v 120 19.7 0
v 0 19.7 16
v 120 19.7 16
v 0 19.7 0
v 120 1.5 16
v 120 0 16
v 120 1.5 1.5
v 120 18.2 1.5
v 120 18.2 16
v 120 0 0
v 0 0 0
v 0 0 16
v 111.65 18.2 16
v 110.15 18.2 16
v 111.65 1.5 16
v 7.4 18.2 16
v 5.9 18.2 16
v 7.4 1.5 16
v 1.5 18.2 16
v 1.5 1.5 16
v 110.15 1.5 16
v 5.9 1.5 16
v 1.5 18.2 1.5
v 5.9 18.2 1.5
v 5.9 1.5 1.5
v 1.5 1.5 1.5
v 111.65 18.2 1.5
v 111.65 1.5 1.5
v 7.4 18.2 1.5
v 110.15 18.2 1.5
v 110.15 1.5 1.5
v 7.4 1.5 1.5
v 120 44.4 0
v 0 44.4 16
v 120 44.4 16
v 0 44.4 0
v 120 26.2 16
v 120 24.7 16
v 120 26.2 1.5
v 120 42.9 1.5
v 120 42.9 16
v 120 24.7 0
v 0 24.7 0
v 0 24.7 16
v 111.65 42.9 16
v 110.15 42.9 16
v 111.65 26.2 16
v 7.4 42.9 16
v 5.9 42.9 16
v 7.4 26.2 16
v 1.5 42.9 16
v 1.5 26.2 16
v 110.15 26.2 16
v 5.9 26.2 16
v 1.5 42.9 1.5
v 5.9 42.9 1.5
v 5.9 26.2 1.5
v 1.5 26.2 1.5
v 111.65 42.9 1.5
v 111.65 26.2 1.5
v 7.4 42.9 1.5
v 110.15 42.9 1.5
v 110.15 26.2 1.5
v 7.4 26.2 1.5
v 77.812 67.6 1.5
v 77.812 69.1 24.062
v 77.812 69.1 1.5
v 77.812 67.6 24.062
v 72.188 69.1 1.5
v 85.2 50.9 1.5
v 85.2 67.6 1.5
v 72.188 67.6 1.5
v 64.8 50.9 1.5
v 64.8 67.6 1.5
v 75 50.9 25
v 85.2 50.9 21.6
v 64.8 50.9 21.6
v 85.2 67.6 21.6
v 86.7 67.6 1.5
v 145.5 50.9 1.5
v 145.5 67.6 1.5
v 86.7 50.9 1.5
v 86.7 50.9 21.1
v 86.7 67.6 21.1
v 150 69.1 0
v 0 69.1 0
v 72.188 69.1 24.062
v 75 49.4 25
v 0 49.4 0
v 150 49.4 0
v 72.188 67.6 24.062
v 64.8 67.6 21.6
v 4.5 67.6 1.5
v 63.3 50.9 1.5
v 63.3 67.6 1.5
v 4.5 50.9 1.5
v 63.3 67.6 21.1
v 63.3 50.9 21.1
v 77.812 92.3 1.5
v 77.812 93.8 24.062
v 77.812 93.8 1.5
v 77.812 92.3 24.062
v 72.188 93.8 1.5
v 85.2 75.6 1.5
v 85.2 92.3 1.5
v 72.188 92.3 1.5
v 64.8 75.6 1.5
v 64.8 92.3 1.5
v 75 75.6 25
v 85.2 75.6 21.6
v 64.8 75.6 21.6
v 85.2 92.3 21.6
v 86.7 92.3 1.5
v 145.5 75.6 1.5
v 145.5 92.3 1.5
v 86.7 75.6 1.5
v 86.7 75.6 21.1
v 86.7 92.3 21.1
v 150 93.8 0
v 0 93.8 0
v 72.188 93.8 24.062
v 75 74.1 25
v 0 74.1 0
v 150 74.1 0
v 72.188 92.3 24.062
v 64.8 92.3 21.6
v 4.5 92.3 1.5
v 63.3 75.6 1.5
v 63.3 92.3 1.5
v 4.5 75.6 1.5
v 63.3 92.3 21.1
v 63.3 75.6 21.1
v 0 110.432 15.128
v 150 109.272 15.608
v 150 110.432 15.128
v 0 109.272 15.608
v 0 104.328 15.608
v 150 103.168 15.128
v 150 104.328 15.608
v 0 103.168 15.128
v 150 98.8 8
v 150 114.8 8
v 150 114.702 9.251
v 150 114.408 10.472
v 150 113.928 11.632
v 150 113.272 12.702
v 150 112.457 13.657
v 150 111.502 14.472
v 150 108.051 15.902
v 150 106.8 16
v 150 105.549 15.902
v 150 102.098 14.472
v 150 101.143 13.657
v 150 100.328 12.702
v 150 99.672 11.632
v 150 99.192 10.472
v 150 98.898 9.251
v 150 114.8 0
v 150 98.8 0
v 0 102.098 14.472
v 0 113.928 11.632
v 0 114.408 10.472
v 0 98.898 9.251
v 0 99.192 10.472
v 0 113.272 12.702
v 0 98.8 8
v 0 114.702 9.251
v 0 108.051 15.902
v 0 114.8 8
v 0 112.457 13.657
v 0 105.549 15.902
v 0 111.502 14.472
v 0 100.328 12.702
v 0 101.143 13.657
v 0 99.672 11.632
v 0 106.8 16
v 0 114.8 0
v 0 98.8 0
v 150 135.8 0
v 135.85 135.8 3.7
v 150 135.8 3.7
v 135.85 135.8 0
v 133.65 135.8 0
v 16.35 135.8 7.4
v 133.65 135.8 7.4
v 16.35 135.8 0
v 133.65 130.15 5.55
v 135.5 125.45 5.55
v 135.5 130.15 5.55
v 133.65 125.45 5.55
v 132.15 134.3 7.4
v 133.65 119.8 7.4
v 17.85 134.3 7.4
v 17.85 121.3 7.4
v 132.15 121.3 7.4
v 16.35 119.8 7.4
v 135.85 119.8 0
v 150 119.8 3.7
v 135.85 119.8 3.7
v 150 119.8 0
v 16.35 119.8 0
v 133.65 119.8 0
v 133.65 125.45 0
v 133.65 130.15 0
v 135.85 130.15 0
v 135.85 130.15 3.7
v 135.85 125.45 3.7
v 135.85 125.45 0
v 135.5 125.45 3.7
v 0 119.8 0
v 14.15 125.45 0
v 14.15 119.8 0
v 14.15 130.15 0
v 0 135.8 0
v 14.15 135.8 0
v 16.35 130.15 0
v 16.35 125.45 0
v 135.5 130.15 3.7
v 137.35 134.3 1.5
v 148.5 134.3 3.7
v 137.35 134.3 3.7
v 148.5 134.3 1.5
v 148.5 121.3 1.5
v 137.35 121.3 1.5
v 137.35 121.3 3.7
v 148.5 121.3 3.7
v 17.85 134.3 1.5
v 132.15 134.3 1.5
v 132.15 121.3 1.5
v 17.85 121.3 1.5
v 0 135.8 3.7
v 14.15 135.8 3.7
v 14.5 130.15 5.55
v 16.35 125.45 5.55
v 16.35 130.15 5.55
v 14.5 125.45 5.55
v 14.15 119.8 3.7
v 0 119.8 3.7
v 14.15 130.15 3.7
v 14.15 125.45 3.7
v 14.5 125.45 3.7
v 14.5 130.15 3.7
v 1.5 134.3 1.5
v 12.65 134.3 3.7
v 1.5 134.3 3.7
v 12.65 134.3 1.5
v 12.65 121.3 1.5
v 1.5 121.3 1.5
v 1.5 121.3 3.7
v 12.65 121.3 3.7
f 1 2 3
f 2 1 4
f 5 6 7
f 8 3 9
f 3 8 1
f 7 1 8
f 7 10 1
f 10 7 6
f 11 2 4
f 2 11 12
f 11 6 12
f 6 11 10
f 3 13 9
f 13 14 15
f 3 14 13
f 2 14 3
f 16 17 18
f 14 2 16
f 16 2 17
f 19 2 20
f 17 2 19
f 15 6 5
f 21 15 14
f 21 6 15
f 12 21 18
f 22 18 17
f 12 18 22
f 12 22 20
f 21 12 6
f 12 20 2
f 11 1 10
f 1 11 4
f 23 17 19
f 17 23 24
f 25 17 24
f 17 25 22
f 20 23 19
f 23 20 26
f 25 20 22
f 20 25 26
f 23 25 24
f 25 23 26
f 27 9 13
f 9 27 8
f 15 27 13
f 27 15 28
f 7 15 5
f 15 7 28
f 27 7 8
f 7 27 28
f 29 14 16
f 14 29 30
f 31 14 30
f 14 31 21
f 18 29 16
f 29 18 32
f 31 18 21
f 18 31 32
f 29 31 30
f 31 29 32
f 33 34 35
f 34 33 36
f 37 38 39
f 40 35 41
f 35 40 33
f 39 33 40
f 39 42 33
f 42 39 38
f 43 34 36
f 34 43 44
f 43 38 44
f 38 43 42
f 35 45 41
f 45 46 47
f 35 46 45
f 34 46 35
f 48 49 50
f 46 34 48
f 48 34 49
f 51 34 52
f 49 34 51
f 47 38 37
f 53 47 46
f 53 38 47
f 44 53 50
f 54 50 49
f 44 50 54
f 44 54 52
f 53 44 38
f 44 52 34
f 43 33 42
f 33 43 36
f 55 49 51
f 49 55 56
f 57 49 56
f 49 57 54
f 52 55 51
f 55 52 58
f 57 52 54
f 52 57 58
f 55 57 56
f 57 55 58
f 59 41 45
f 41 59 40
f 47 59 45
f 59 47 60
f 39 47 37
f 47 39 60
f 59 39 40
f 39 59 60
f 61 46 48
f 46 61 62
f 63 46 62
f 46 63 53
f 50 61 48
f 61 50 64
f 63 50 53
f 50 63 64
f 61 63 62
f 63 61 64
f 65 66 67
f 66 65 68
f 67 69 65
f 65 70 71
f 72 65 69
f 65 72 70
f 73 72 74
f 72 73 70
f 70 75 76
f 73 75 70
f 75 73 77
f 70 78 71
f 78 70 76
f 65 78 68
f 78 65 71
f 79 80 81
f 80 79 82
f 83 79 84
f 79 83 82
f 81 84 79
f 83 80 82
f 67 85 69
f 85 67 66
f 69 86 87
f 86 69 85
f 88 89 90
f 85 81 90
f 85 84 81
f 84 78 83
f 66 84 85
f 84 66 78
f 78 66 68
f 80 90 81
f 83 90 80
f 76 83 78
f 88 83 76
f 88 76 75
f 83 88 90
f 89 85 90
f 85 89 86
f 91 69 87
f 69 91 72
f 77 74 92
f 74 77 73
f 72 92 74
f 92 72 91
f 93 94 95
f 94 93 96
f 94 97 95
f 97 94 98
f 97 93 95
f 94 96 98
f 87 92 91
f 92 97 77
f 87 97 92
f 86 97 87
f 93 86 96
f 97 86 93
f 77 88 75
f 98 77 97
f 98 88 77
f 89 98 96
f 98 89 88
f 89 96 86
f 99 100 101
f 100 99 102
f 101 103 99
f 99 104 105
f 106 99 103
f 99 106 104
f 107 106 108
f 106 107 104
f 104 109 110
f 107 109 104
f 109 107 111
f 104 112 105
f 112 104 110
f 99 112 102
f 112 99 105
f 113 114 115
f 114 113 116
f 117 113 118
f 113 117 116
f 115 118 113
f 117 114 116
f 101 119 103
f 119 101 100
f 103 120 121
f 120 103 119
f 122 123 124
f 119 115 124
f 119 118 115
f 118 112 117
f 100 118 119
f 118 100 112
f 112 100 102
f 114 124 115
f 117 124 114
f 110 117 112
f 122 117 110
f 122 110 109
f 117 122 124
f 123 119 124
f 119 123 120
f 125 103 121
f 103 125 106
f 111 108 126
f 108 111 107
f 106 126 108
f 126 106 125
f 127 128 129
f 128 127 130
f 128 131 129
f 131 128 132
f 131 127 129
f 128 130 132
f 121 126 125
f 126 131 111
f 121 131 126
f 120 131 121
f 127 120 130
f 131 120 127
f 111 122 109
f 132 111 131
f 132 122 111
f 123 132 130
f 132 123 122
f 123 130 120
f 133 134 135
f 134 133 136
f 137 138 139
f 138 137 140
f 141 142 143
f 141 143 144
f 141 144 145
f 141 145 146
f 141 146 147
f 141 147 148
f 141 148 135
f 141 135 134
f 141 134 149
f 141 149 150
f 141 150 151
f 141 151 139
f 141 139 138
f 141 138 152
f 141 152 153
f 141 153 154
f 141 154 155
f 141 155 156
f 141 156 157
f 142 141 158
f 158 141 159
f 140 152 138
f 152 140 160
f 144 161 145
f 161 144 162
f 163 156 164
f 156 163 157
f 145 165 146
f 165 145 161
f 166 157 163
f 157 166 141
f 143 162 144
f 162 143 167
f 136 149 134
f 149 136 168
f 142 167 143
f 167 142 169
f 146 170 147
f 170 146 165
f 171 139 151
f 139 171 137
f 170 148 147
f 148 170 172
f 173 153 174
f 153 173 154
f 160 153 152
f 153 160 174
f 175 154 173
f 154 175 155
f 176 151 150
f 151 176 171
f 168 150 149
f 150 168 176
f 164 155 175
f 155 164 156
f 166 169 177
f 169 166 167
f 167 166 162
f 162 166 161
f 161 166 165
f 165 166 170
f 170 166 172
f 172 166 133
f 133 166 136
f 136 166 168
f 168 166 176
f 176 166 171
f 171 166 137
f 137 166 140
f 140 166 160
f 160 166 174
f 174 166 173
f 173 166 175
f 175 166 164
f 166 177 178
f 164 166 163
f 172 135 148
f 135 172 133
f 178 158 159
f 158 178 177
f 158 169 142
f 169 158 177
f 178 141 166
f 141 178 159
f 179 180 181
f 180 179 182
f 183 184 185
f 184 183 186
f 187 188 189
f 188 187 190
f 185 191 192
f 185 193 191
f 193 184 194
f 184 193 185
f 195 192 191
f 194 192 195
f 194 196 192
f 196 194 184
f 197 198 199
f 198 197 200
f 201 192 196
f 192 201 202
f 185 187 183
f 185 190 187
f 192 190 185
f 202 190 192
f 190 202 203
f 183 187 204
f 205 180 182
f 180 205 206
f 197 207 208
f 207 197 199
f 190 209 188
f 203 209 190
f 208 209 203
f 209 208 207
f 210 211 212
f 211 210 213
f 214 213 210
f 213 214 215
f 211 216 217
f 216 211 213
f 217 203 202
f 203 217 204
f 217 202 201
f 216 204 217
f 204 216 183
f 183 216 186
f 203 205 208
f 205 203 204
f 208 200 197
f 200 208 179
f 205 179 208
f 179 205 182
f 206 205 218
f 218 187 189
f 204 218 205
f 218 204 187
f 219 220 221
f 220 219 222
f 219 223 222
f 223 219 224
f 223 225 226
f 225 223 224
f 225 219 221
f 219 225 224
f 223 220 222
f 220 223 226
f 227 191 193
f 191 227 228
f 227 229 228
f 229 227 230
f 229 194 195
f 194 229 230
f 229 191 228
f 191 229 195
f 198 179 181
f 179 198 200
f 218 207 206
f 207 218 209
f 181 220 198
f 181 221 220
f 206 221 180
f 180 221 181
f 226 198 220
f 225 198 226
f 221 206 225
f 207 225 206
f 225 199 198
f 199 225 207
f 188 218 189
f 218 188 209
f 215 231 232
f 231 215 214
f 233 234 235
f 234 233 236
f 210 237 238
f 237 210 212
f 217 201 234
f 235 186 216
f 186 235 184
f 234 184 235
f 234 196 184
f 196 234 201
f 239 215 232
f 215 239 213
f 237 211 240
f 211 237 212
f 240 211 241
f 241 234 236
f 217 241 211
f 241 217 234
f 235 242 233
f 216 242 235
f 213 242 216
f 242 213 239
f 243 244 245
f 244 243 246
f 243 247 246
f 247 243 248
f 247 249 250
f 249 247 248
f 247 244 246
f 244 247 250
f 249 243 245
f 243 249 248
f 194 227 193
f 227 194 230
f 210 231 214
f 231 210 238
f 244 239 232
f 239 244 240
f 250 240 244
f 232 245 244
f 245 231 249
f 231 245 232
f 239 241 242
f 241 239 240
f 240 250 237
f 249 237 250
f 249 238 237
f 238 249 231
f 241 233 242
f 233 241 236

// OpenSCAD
/**
 * PARAMETRIC TABLETOP SPOOL HOLDER
 * 
 * @author	Pacien TRAN-GIRARD
 * @version	1.1
 * @license	CC BY-NC-SA 3.0
 */


/***** PARAMETERS *****/

material_thickness = 1.5;
material_space = 0.35;
material_eco = true;

rod_length = 150;
rod_radius = 8;

pillar_height = 120;

base_height = 25;
base_length = 150;


/***** TO PRINT *****/

// preview_all();

print_all();

// print_base();
// print_coupler();
// print_rod();
// print_pillar();



/********** This is where it gets complicated **********/



/***** MODELS *****/


module print_all() {
	
	space=5;

		print_pillar();

		translate([0, 2*rod_radius+2*(material_thickness+material_space)+space, 0]) {

			print_pillar();

			translate([0, 2*rod_radius+2*(material_thickness+material_space)+space, 0]) {

				print_base();

				translate([0, 2*rod_radius+2*(material_thickness+material_space)+space, 0]) {

					print_base();

					translate([0, 2*rod_radius+2*(material_thickness+material_space)+space, 0]) {

						print_rod();

						translate([0, rod_radius*2+space, 0]) {

							print_coupler();

						}
					}
				}
			}
		}

}

module preview_all() {

	translate([	-(rod_radius+material_thickness+material_space),
					material_thickness+material_space,
					material_thickness+material_space]) {

		sized_pillar();

		translate([0, rod_length+2*(material_thickness+material_space), 0]) {
			mirror([0, 1, 0]) {
				sized_pillar();
			}
		}

		translate([	rod_radius+material_thickness+material_space,
						material_thickness+material_space,
						pillar_height]) {
			rotate([0, 0, 90]) {
				sized_rod();
			}
		}
	
	}
	
	sized_base();

	translate([0, rod_length+4*(material_thickness+material_space), 0]) {
		mirror([0, 1, 0]) {
			sized_base();
		}
	}

	translate([-rod_radius, 2*(material_thickness+material_space), 0]) {
		sized_coupler();
	}

}


/***** MODULE TRANSLATING *****/

module print_base() {
	translate([base_length/2, 0, 0]) {
		sized_base();
	}
}

module print_coupler() {
	translate([rod_length, 0, 4*(material_thickness+material_space)]) {
		rotate([0, 0, 90]) {
			mirror([0, 0, 1]) {
				sized_coupler();
			}
		}
	}
}

module print_rod() {
	translate([0, rod_radius, rod_radius]) {
		sized_rod();
	}
}

module print_pillar() {
	rotate([90, 0, 90]) {
		sized_pillar();
	}
}


/***** MODULE SIZING *****/

module sized_base() {
	base(	base_length,
				2*rod_radius+2*(material_thickness+material_space),
				base_height,
				material_thickness,
				material_space,
				material_eco
	);
}

module sized_coupler() {
	coupler(rod_length, 2*rod_radius, material_thickness, material_space, material_eco);
}

module sized_rod() {
	rod(rod_length, rod_radius);
}

module sized_pillar() {
	pillar(	2*rod_radius+2*(material_thickness+material_space),
				2*rod_radius,
				pillar_height,
				material_thickness,
				rod_radius+material_space,
				material_eco);
}


/***** MODULES *****/

module base(length, width, height, material_thickness, material_space, material_eco) {
	
	half_base(length/2, width, height, material_thickness, material_space, material_eco);
	
	mirror([1, 0, 0]) {
		half_base(length/2, width, height, material_thickness, material_space, material_eco);
	}
	
}

module half_base(length, width, height, material_thickness, material_space, material_eco) {
	
	difference() {
		
		prism(width, length, height);
		
		translate([0, material_thickness, material_thickness]) {
			cube([width/8+material_space, width, height]);
			
			cube([width/2+material_space, width-2*material_thickness, height]);

			if (material_eco == true) {
				translate([width/2+material_thickness+material_space, 0, 0]) {
					cube([length, width-2*material_thickness, height]);
				}
			}

		}

	}
	
}

module pillar(length, width, height, material_thickness, rod_slot, material_eco) {
	
	coupler_slot_height = 2*(material_thickness+material_space)+2*material_space;
	length_inside = length-2*material_thickness;
	width_inside = width-material_thickness;

	difference() {
		
		cube([length, width, height]);

		translate([material_thickness, material_thickness, material_thickness]) {
			cube([length_inside, width_inside, coupler_slot_height]);
		}
		
		translate([material_thickness, material_thickness, height-rod_slot]) {
			cube([length_inside, width_inside, rod_slot]);
		}
		
		if (material_eco == true) {
			translate([material_thickness, material_thickness, coupler_slot_height+2*material_thickness]) {
				cube([length_inside, width_inside, height-coupler_slot_height-(3*material_thickness+rod_slot)]);
			}
		}
		
	}
	
}

module coupler(length, width, material_thickness, material_space, material_eco) {

	half_coupler(length/2, width, material_thickness, material_space, material_eco);

	translate([0, length, 0]) {
		mirror([0, 1, 0]) {
			half_coupler(length/2, width, material_thickness, material_space, material_eco);
		}
	}

}

module half_coupler(length, width, material_thickness, material_space, material_eco) {

	height = 4*(material_thickness+material_space);
	width_inside = width-2*material_thickness;

	difference() {

		cube([width, length, height]);

		cube([width, width-material_thickness, 2*(material_thickness+material_space)]);

		translate([0, width-(material_thickness+material_space), 0]) {

			cube([width, material_thickness+2*material_space, material_thickness+material_space]);

			cube([width/2-(width/8+material_space), material_thickness+2*material_space, height]);

			translate([width/2+(width/8+material_space), 0, 0]) {
				cube([width/2-(width/8+material_space), material_thickness+2*material_space, height]);
			}
				
		}

		if (material_eco == true) {

			translate([material_thickness, material_thickness, 0]) {
				cube([width_inside, width-(3*material_thickness+material_space), height-material_thickness]);
			}
		
			translate([material_thickness, width+material_thickness+material_space, 0]) {
				cube([width_inside, length-(width+material_thickness+material_space), height-material_thickness]);
			}
		
		}
		
	}
}

module rod(length, radius) {
	
	rotate([0, 90, 0]) {
		cylinder(h=length, r=radius, $fn=5*radius);
	}
	
	translate([0, -radius, -radius]) {
		cube([length, 2*radius, radius]);
	}

}


/***** THIRD PARTY *****/

//https://github.com/dannystaple/OpenSCAD-Parts-Library/blob/master/prism.scad
//Draw a prism based on a 
//right angled triangle
//l - length of prism
//w - width of triangle
//h - height of triangle
module prism(l, w, h) {
	translate([0, l, 0]) rotate( a= [90, 0, 0]) 
	linear_extrude(height = l) polygon(points = [
		[0, 0],
		[w, 0],
		[0, h]
	], paths=[[0,1,2,0]]);
}
